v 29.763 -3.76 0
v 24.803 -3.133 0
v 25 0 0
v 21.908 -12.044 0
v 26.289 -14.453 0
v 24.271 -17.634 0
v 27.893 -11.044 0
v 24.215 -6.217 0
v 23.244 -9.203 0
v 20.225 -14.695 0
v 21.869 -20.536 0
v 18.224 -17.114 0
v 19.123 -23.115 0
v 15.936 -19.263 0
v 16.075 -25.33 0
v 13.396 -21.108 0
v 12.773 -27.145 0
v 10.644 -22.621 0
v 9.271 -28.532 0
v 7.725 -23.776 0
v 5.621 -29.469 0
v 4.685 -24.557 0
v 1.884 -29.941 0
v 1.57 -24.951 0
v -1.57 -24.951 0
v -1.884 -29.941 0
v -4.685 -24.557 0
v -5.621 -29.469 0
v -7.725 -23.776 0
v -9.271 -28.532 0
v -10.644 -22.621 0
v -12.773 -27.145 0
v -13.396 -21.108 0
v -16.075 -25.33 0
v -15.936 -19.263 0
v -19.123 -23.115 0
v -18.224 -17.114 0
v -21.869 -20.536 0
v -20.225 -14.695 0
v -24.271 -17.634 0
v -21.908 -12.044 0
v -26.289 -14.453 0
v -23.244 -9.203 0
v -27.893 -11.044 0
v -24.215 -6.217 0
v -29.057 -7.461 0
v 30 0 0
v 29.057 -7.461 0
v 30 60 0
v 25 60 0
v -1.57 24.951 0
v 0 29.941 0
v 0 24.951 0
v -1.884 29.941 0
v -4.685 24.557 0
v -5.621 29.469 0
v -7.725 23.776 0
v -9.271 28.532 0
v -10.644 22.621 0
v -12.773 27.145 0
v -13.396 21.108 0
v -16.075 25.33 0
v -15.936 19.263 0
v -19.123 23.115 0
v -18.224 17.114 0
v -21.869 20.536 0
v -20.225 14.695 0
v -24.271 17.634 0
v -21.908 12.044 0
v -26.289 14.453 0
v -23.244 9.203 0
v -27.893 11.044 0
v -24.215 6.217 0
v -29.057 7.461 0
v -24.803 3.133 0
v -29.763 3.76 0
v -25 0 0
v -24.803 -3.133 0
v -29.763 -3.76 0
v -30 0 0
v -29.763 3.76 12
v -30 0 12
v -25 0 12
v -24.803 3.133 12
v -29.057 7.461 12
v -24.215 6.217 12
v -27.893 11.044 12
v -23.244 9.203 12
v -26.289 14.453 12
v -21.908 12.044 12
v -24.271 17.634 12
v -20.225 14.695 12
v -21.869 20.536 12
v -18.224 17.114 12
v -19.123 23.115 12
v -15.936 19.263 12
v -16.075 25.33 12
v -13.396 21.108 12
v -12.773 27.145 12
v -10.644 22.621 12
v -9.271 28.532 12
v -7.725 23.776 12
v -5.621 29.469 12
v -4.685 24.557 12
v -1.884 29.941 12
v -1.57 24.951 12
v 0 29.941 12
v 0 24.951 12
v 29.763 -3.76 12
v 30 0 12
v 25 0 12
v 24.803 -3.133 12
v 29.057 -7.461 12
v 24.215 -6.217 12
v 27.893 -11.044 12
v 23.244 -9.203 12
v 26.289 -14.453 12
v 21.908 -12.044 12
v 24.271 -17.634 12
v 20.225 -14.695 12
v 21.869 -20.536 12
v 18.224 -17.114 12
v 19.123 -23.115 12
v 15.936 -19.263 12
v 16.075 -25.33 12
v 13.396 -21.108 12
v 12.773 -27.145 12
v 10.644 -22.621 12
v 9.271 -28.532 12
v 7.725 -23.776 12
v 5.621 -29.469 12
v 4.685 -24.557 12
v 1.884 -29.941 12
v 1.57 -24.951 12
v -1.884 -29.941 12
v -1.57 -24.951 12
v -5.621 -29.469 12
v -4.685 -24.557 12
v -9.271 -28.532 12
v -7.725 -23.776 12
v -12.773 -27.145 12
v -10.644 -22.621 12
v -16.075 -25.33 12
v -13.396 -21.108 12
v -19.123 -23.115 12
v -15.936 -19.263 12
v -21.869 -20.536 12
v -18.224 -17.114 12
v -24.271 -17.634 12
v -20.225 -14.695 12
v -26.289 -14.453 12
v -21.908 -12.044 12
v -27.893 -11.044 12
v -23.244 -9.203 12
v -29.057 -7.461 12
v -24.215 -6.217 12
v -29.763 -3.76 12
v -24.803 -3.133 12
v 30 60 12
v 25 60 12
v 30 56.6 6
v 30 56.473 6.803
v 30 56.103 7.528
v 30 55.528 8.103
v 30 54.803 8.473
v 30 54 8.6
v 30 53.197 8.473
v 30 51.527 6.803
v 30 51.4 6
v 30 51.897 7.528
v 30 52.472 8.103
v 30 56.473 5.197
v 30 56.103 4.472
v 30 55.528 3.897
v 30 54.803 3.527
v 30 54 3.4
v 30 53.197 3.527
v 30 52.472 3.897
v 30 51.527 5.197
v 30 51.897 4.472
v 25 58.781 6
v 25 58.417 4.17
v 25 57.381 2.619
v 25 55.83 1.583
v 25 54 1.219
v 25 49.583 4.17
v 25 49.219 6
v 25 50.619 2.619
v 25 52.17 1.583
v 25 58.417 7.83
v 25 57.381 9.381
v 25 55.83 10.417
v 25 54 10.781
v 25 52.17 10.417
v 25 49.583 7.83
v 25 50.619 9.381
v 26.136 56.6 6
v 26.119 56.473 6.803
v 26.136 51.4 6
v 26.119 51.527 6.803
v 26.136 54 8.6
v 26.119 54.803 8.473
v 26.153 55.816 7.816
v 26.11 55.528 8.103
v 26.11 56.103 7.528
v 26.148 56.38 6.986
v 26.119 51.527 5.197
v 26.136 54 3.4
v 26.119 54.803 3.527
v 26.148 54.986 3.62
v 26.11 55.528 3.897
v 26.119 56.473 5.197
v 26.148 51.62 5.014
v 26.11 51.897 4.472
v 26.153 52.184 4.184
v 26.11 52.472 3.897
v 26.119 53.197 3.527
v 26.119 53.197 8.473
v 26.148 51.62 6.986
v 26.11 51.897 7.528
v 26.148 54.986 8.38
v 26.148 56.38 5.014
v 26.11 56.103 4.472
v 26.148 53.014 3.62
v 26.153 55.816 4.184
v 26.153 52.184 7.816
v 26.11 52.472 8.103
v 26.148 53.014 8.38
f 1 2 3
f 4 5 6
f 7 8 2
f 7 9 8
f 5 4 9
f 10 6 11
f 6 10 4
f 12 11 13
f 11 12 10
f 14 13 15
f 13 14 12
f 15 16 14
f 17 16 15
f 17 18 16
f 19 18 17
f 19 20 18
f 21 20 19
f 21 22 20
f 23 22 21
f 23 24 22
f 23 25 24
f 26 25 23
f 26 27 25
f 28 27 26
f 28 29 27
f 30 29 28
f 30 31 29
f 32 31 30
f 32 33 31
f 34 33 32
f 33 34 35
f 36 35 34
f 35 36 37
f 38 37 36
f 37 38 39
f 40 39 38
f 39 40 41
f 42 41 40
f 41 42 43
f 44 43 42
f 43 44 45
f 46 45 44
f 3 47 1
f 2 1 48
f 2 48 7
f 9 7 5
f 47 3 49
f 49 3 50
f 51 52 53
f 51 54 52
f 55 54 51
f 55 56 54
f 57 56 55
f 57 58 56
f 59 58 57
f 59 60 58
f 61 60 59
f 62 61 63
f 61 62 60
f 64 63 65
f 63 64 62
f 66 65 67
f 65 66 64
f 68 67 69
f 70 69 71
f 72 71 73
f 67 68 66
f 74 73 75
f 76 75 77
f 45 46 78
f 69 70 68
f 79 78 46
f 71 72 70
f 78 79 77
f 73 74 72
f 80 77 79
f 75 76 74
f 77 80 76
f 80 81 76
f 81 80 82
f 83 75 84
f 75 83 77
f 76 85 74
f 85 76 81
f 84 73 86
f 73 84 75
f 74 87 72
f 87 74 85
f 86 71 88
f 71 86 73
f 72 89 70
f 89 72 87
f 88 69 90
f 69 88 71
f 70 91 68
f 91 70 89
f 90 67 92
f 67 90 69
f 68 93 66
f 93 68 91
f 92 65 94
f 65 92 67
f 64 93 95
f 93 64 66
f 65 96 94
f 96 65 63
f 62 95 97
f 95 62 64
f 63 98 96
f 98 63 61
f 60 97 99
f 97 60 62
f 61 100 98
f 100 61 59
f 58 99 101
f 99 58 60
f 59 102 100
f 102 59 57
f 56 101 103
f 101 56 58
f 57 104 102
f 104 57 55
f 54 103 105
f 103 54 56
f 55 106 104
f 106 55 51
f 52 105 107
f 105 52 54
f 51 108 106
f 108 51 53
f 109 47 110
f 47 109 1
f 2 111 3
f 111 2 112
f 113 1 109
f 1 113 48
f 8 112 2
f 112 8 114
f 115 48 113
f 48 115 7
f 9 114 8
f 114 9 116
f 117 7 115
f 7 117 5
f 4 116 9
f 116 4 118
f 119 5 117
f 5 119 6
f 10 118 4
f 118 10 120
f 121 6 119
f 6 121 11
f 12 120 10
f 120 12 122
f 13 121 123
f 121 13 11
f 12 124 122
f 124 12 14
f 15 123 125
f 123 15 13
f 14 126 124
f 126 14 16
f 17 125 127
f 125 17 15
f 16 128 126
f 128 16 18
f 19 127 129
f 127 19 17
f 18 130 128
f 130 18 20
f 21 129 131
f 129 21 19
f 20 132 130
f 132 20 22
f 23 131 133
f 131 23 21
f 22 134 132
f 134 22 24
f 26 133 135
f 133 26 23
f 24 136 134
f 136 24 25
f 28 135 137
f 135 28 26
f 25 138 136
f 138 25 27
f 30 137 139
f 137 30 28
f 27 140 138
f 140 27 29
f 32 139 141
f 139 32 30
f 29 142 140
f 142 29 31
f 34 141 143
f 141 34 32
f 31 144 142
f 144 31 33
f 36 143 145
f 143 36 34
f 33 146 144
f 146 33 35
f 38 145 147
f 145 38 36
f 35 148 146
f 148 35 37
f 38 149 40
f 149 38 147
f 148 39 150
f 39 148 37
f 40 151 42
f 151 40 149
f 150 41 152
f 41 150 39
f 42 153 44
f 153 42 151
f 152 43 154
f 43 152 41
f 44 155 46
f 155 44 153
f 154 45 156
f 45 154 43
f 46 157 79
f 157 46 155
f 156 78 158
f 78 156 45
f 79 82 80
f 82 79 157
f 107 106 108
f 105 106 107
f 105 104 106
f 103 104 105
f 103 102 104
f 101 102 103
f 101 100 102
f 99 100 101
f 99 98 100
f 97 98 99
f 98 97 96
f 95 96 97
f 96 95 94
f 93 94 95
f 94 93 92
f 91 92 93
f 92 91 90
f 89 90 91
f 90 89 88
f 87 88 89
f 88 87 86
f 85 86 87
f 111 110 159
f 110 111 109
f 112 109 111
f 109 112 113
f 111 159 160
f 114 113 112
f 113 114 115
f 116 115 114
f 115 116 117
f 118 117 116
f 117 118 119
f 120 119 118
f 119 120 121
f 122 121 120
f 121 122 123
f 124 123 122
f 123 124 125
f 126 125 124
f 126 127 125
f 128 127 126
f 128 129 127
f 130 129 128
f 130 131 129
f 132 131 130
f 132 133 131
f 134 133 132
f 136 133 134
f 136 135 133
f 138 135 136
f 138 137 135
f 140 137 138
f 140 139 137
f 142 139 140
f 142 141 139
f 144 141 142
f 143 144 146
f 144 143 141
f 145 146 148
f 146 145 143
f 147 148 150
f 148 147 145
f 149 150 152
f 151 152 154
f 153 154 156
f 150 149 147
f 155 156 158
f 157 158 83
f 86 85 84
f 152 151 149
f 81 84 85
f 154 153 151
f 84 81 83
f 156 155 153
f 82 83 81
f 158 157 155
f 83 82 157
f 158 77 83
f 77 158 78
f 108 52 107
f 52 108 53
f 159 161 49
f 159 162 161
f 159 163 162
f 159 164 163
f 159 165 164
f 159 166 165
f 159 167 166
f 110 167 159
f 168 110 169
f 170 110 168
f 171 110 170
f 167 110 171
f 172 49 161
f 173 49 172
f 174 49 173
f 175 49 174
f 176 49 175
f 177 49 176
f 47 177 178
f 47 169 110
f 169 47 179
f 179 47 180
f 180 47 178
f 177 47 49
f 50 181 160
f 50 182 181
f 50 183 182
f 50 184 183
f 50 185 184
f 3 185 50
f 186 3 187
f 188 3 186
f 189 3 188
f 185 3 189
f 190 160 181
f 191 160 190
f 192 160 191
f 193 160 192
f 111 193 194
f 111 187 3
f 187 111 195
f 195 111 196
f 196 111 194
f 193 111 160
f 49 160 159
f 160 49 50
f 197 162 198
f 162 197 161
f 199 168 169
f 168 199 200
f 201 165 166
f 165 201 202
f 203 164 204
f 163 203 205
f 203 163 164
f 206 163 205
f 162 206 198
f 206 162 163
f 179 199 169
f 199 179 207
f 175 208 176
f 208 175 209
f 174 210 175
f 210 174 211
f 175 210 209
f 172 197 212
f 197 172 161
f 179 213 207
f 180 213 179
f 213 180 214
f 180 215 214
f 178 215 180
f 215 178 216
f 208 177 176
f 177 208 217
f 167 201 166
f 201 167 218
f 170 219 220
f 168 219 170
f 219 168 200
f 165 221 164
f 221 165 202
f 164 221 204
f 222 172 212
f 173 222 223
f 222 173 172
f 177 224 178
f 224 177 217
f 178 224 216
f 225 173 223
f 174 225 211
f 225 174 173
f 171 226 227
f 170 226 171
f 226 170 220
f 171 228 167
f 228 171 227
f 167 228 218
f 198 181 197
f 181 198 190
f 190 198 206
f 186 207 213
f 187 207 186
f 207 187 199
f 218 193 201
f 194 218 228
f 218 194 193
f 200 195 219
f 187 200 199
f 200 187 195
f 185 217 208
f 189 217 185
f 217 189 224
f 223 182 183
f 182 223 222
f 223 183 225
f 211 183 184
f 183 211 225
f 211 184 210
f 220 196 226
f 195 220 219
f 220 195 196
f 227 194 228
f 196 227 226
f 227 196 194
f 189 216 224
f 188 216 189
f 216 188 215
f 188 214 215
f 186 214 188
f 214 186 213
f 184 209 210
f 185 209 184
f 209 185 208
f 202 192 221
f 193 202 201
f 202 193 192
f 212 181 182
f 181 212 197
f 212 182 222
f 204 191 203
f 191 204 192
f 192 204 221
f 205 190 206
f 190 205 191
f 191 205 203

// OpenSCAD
// [FL_INDEX: keywords="openscad, 3d_parametric, Customizable_wire_hanging_hook_with_screw_mount, csg_solid" | COT="Parametric OpenSCAD design from 3DCodeverse"]
// Title: Customizable wire hanging hook with screw mount

// Radius of hook [mm]
hookRadius=25; 
// Width of hook [mm]
width=12; 
//Thickness of hook [mm]
thickness=5; 
// Radius of mounting hole [mm]
holeRadius=2.6; 
// height of mounting section [mm]
height=60;  

union() {

	difference() {
		rotate_extrude(convexity = 10,$fn=50)
		translate([hookRadius, 0, 0])
		square([thickness,width]);
	
		translate([0,0,-1])
		cube([hookRadius*2,hookRadius*2,width+2]);
	}
	
	
	difference() {
		translate([hookRadius,0,0])
		cube([thickness,height,width]);
	
		translate([hookRadius-1,height-max(holeRadius*2, width/2),width/2])
		rotate([90,0,90])
		cylinder(r=holeRadius,h=thickness+2,$fn=20);
		translate([hookRadius-0.01,height-max(holeRadius*2, width/2),width/2])
		rotate([90,0,90])
		cylinder(r1=4.8,r2=0,h=min(thickness/2, 5));
	}
}
